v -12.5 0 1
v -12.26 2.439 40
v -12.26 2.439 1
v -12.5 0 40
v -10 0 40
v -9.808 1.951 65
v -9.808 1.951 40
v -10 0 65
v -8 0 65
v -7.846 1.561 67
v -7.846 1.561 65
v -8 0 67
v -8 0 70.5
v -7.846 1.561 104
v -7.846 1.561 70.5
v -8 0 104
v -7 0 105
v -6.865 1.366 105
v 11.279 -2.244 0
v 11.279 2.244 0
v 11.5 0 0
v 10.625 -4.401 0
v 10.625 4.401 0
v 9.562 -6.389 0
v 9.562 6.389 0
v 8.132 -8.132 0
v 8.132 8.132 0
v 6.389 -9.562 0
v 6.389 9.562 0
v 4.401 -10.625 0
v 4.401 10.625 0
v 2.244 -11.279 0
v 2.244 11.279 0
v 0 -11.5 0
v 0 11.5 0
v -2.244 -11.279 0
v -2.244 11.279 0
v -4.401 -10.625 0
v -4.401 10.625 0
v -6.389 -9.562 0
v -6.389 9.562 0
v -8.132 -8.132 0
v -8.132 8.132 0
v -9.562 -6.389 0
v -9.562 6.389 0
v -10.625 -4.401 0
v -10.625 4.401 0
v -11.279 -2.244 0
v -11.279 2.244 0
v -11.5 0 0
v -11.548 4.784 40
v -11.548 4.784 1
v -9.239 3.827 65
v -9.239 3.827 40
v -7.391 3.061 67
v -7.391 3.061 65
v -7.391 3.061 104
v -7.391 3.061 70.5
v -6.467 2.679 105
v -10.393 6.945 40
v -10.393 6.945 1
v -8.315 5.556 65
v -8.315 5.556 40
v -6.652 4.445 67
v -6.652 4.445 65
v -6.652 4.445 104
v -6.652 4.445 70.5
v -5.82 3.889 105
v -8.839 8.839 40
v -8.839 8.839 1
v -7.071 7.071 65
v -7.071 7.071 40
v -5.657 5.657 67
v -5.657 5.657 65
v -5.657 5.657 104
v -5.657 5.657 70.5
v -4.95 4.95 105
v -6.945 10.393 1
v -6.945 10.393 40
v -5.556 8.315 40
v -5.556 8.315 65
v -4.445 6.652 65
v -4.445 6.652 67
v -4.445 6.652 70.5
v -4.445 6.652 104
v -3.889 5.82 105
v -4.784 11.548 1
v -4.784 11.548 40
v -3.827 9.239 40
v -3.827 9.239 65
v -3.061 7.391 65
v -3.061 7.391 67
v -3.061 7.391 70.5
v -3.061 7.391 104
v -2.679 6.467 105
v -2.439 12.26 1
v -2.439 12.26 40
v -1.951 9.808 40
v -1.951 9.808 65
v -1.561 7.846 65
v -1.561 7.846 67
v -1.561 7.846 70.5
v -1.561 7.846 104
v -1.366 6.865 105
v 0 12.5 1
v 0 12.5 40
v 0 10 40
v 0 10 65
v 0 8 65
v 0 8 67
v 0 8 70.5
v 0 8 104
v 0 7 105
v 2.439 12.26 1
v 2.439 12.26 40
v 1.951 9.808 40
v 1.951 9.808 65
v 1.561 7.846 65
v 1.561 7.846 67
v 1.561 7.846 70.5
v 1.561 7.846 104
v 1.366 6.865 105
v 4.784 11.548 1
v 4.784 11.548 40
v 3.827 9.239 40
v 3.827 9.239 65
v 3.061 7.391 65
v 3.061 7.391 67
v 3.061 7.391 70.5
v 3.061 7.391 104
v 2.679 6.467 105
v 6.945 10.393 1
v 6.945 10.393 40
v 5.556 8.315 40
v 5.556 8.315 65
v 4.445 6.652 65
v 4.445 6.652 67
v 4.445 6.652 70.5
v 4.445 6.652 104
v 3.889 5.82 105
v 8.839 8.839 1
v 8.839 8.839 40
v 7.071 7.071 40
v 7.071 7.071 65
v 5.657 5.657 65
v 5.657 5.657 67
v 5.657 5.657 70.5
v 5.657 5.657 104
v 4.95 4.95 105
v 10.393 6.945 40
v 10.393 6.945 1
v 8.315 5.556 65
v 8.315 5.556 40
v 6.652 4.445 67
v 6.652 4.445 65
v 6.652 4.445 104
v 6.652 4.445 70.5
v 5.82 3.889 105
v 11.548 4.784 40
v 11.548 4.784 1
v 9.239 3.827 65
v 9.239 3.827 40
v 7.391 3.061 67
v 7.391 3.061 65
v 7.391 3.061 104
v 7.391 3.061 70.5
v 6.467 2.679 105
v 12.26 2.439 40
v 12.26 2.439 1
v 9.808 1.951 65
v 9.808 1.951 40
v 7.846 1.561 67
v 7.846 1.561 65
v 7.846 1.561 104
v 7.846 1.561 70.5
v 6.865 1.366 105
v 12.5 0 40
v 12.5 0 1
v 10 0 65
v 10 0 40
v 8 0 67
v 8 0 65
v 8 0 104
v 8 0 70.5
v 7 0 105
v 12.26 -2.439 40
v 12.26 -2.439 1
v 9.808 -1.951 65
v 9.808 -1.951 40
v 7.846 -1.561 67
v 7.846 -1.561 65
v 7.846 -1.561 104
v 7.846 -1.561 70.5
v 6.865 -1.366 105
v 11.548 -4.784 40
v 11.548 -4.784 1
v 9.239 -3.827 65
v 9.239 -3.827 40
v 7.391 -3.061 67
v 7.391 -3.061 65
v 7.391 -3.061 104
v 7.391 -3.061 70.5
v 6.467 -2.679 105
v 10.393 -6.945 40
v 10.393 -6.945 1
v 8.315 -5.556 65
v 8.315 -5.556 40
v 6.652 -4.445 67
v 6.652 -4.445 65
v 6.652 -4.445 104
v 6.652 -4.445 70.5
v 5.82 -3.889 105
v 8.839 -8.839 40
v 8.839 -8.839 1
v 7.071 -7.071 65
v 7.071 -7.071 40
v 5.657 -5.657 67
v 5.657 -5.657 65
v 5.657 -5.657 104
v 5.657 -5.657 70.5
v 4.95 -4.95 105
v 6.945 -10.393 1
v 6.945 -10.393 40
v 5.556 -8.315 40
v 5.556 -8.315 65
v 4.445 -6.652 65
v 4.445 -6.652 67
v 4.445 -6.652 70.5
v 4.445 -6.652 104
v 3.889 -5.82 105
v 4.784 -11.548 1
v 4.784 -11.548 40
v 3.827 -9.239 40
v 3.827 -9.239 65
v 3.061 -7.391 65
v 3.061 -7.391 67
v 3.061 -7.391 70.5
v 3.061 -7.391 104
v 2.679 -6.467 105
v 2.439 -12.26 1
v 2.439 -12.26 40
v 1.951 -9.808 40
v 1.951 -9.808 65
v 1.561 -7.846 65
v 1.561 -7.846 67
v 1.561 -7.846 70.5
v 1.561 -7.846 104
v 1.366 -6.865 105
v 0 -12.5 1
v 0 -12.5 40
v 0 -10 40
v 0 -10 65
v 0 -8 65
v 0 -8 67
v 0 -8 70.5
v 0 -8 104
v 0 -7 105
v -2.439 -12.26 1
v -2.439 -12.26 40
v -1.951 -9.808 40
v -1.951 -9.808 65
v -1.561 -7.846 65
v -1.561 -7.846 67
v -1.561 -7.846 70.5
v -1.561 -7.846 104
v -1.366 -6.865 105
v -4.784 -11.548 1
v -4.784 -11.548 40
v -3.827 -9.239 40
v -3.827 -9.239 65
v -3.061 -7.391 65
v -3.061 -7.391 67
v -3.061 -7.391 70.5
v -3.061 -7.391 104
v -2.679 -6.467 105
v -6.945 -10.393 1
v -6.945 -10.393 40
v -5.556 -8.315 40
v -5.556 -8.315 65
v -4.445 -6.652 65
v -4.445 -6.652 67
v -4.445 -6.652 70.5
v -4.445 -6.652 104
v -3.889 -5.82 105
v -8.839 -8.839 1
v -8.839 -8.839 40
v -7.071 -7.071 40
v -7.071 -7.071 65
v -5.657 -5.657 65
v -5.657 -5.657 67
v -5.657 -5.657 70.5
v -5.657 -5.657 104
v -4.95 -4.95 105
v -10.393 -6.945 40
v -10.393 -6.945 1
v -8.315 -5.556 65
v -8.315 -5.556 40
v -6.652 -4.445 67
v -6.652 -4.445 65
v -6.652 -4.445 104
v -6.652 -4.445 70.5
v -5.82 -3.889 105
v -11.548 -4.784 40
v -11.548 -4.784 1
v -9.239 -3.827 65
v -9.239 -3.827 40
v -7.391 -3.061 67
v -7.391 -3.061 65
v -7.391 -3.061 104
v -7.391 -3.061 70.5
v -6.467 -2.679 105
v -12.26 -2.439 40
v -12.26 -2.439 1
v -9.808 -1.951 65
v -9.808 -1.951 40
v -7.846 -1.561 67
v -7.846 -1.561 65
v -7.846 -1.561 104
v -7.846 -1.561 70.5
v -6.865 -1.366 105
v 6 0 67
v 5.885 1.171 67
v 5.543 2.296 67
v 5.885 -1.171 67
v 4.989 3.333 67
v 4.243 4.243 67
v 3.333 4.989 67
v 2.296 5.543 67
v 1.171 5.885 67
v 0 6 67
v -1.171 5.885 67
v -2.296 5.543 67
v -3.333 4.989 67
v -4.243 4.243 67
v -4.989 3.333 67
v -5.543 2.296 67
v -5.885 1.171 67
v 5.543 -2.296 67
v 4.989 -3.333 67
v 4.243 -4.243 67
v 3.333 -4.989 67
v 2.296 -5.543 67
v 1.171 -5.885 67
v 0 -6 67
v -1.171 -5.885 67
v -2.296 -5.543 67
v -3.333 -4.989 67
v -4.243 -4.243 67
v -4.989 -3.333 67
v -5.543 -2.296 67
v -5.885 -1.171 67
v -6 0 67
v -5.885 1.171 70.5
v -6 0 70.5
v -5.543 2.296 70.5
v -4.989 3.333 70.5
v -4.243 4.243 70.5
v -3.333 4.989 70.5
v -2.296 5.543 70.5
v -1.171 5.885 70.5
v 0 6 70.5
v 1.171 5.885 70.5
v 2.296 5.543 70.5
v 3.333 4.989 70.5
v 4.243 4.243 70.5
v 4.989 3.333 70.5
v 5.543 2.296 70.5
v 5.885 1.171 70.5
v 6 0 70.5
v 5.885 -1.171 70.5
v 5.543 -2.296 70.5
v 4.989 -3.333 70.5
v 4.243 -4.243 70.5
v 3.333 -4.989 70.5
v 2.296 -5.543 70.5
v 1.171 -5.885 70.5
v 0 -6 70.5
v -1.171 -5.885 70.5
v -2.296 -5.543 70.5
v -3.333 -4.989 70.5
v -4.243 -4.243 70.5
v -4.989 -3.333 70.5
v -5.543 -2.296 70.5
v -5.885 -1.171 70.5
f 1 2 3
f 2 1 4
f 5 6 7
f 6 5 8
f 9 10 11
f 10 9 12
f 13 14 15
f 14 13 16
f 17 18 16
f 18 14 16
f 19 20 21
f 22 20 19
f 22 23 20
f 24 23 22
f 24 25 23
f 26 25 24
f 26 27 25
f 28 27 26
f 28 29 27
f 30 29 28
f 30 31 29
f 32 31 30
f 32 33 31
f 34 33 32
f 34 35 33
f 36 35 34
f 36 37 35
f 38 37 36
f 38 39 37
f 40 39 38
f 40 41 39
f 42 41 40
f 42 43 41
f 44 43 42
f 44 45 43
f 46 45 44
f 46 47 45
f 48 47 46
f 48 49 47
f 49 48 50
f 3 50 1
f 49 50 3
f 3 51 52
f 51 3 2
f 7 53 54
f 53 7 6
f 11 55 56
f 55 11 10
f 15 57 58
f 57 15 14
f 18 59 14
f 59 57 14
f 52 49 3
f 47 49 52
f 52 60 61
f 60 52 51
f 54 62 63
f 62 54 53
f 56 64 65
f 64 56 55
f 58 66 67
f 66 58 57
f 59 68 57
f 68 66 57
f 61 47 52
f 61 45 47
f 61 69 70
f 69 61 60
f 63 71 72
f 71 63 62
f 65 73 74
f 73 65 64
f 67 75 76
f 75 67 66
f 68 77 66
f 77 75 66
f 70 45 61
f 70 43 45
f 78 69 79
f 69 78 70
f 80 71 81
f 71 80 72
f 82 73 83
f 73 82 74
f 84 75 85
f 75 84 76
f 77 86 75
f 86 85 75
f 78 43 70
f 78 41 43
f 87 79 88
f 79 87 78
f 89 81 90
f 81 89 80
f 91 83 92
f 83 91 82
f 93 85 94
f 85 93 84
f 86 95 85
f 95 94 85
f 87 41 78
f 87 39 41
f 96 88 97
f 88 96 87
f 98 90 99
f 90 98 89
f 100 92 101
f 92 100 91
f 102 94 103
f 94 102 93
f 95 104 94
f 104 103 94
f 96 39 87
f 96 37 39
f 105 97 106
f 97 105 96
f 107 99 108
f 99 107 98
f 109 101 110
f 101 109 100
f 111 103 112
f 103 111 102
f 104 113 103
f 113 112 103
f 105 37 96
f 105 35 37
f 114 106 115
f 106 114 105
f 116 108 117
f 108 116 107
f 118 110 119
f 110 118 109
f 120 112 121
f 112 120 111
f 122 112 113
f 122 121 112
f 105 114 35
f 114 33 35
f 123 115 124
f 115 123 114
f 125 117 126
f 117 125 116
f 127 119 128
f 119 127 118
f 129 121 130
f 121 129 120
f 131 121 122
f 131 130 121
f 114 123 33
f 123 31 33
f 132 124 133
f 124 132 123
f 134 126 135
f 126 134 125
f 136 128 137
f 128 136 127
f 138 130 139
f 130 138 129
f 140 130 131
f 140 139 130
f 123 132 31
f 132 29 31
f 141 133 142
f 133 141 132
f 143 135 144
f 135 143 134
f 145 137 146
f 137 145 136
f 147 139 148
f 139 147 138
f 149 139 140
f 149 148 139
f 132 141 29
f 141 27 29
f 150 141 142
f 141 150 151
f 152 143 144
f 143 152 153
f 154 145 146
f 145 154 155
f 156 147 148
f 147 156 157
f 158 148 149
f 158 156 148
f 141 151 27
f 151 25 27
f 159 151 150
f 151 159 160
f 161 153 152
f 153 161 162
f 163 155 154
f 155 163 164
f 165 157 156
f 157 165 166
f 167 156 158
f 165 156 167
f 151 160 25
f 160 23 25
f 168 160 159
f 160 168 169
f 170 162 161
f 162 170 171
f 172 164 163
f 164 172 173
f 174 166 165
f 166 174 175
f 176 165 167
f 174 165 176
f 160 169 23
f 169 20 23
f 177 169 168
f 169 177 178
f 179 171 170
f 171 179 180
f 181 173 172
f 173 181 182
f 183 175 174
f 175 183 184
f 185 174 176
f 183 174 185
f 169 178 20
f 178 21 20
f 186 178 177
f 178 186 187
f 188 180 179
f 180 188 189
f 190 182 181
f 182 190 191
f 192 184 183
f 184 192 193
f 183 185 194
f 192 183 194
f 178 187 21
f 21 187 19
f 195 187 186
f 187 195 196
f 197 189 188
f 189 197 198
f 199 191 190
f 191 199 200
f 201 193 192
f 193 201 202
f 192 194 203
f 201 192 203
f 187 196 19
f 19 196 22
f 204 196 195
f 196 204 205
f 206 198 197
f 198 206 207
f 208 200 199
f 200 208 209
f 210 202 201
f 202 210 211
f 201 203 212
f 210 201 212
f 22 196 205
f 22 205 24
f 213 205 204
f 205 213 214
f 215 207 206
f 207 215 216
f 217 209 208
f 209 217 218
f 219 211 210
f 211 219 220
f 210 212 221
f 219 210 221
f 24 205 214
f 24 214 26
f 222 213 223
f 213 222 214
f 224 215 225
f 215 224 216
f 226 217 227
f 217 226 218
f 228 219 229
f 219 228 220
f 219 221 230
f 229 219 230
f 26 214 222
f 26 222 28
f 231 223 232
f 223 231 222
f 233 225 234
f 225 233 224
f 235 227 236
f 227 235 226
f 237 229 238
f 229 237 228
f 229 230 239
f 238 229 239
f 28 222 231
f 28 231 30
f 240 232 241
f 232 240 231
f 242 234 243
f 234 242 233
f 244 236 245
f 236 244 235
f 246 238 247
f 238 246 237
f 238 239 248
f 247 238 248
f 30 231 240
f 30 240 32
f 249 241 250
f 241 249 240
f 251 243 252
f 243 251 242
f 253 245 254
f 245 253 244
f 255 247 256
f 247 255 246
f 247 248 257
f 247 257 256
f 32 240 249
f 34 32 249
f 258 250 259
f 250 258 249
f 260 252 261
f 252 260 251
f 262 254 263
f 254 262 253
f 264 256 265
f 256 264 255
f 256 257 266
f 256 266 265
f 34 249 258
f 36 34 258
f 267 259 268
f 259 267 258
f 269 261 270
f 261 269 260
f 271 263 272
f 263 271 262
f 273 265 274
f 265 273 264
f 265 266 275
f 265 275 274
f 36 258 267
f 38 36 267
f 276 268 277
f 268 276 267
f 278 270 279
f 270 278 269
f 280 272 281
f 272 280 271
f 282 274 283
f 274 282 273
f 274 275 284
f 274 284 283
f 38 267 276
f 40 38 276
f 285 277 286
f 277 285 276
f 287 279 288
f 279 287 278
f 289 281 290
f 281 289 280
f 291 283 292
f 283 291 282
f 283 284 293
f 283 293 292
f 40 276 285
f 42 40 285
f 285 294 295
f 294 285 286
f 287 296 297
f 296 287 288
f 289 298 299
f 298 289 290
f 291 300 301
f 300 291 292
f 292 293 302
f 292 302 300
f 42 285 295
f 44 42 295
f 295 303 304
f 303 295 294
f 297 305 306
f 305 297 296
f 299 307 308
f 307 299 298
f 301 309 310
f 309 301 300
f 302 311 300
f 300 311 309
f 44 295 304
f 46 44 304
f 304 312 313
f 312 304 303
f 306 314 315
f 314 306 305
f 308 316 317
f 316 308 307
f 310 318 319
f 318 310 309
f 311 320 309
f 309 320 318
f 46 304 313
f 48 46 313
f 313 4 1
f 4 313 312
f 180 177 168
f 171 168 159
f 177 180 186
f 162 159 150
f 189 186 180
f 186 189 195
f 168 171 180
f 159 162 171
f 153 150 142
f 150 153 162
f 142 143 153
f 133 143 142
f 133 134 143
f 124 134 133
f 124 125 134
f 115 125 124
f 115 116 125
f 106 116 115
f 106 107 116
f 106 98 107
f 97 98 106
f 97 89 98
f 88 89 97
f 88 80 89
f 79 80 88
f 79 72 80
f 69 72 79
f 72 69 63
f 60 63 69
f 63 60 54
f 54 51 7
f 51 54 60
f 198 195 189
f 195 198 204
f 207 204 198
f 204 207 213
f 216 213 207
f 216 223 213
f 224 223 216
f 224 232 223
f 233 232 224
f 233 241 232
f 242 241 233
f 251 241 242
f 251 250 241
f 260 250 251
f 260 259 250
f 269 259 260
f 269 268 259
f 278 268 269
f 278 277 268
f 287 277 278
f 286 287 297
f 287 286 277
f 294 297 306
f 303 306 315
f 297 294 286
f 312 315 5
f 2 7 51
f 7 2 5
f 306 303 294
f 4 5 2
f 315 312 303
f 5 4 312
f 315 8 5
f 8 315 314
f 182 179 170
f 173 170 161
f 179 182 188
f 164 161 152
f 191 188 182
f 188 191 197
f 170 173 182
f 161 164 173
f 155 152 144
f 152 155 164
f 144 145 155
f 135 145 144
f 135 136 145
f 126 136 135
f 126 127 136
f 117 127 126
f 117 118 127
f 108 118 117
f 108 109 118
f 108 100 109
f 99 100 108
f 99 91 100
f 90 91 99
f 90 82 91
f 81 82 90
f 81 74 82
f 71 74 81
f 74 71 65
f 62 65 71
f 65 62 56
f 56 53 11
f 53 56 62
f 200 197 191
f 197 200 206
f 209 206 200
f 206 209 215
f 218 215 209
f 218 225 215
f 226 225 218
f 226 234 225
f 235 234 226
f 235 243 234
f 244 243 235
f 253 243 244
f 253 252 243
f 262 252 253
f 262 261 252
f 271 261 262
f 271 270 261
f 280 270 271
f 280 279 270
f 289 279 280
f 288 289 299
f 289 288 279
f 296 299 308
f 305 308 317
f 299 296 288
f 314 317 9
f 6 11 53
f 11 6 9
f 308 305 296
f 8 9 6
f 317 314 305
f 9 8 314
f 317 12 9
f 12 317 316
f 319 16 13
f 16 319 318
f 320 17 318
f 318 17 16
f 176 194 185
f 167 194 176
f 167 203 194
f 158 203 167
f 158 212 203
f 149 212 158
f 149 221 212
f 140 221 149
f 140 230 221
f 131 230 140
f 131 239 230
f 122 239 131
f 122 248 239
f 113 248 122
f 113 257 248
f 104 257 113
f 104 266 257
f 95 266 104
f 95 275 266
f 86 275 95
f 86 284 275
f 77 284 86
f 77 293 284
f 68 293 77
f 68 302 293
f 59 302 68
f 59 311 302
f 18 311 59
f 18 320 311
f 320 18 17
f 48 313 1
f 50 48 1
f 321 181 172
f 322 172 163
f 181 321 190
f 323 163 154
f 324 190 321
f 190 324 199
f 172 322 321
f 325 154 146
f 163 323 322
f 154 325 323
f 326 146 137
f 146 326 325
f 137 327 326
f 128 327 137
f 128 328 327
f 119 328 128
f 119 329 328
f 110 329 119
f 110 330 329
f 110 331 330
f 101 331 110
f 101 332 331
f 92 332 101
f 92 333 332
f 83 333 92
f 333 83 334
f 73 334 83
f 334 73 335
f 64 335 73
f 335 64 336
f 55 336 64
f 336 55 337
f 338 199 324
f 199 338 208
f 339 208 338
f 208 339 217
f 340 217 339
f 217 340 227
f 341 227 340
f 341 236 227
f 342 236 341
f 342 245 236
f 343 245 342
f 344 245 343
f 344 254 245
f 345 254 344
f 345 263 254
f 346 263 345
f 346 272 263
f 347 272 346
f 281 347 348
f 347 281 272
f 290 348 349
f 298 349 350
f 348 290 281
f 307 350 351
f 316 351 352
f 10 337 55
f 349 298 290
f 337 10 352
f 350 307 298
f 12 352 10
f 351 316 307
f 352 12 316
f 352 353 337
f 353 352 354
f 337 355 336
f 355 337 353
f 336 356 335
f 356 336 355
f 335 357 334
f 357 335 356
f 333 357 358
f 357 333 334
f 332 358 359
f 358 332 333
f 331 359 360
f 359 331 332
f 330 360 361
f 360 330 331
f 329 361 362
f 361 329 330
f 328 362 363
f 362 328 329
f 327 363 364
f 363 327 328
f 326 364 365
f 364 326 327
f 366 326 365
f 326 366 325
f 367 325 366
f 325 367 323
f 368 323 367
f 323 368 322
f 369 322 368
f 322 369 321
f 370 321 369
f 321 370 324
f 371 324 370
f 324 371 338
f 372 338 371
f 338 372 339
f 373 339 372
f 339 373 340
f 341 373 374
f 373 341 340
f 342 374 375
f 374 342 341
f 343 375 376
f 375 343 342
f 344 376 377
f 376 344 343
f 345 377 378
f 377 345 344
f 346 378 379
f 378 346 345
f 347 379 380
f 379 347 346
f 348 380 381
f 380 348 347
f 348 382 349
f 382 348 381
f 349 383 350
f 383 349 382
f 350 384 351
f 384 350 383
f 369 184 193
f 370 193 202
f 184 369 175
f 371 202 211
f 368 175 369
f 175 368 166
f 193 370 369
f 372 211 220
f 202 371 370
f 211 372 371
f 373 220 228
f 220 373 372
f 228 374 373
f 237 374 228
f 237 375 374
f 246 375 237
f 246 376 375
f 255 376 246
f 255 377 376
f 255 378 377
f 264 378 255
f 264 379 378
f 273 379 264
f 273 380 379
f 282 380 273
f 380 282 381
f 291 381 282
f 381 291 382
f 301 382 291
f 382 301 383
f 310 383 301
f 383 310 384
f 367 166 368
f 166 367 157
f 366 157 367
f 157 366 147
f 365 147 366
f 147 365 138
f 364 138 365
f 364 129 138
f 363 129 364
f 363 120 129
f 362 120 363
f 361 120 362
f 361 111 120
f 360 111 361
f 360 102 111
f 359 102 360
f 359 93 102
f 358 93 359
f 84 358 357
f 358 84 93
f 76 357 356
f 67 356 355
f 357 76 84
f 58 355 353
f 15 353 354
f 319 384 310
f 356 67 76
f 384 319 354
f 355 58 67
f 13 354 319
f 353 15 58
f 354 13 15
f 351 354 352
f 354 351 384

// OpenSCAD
$fn = 32;

// ----------------------------------------------------------------------
// Stepped shaft: diameters 25, 20, 16 mm, 105 mm long
// ----------------------------------------------------------------------

// --- parameters (mm) ---
d1 = 25;                  // step 1 diameter
len1 = 40;                // step 1 length
d2 = 20;                  // step 2 diameter
len2 = 25;                // step 2 length
d3 = 16;                  // step 3 diameter
len3 = 40;                // step 3 length
total = 105;              // overall length
chamfer = 1;              // end chamfer
groove_r = 8;             // groove radius
groove_z = 67;            // groove position from the end
groove_w = 3.5;           // groove width
groove_d = 2;             // groove depth

/* closed turning profile: x is the radius, y is the length */
profile = [[0, 0], [12.5 - chamfer, 0], [12.5, chamfer], [12.5, 40], [10, 40], [10, 65], [8, 65], [8, 104], [7, 105], [0, 105]];

difference() {
  rotate_extrude() polygon(profile);
  /* circlip groove just behind the shoulder */
  rotate_extrude() translate([groove_r - groove_d, groove_z]) square([groove_d + 1, groove_w]);
}
